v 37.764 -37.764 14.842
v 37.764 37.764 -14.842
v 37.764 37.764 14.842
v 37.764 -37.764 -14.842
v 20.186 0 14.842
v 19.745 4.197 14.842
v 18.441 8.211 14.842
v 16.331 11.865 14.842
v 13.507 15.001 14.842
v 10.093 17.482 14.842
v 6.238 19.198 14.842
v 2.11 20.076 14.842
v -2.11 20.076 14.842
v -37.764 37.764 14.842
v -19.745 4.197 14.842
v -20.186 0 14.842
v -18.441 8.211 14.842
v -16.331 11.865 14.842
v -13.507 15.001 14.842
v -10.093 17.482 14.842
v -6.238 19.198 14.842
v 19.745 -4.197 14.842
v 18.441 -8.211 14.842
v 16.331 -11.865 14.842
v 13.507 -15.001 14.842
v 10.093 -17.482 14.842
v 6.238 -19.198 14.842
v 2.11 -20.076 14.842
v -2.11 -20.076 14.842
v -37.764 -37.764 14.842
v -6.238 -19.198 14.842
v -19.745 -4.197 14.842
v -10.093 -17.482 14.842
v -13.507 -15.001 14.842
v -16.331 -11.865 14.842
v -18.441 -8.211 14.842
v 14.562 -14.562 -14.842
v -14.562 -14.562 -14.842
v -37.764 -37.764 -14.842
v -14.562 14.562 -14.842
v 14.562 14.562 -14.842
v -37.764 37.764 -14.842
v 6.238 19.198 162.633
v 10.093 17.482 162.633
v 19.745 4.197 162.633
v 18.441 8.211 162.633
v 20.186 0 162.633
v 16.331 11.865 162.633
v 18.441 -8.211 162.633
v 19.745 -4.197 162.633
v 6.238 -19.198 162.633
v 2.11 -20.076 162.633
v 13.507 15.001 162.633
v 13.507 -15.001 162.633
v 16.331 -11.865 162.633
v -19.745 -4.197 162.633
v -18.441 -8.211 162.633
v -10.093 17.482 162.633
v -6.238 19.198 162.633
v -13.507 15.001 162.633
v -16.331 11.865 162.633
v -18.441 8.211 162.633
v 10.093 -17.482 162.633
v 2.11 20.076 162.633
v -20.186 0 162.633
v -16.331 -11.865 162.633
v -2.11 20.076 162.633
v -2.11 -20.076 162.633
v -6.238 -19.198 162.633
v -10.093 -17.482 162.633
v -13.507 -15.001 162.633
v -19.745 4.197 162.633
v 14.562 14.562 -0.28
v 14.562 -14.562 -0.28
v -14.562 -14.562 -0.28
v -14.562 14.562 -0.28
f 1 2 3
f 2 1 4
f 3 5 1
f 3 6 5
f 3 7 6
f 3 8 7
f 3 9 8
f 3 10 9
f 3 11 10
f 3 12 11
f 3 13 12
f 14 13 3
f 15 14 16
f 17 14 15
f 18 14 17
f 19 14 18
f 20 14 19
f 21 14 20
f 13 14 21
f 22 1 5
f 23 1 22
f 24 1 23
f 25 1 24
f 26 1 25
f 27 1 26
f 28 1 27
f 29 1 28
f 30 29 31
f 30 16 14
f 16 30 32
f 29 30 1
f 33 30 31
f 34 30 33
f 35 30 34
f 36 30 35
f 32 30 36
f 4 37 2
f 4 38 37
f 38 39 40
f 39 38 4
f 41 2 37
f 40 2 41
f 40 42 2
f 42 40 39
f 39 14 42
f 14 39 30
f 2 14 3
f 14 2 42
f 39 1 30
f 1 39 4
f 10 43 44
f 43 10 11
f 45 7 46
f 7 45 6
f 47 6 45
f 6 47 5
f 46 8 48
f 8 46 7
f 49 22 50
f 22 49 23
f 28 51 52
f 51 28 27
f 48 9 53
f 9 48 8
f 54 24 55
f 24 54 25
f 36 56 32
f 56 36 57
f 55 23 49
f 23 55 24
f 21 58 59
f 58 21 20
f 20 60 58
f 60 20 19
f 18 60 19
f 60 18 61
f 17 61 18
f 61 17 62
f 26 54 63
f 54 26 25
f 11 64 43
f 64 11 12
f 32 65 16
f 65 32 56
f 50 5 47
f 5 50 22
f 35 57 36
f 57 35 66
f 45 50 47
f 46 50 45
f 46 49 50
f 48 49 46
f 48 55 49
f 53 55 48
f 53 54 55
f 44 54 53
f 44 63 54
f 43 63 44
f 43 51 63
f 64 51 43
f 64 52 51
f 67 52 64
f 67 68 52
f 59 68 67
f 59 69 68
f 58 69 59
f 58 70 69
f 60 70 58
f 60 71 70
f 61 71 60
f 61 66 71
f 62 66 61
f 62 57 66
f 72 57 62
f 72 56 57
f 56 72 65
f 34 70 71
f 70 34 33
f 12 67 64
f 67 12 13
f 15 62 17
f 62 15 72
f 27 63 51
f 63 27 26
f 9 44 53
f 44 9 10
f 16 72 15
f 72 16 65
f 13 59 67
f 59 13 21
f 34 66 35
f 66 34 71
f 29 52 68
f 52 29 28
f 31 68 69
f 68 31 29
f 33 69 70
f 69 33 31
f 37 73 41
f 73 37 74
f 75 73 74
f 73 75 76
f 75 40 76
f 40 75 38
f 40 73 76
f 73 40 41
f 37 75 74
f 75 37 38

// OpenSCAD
seed = 6;
seeds = rands(0,1000000,10,seed);
head_size = rands(50,100,1,seeds[1])[0];
head_length = rands(10,40,1,seeds[2])[0];
bolt_length = rands(head_length*2,200,1,seeds[3])[0];
bolt_radius = rands(head_size/5, head_size/3,1,seeds[0])[0];
cube_size = rands(head_size/3, head_length*1.5,1, seeds[4])[0];

difference(){
    union(){
        cube([head_size,head_size,head_length], center=true);
        cylinder(bolt_length,bolt_radius,bolt_radius);
    }
    translate([0,0,-head_length/2]){
        cube(cube_size, true);
    }
}
